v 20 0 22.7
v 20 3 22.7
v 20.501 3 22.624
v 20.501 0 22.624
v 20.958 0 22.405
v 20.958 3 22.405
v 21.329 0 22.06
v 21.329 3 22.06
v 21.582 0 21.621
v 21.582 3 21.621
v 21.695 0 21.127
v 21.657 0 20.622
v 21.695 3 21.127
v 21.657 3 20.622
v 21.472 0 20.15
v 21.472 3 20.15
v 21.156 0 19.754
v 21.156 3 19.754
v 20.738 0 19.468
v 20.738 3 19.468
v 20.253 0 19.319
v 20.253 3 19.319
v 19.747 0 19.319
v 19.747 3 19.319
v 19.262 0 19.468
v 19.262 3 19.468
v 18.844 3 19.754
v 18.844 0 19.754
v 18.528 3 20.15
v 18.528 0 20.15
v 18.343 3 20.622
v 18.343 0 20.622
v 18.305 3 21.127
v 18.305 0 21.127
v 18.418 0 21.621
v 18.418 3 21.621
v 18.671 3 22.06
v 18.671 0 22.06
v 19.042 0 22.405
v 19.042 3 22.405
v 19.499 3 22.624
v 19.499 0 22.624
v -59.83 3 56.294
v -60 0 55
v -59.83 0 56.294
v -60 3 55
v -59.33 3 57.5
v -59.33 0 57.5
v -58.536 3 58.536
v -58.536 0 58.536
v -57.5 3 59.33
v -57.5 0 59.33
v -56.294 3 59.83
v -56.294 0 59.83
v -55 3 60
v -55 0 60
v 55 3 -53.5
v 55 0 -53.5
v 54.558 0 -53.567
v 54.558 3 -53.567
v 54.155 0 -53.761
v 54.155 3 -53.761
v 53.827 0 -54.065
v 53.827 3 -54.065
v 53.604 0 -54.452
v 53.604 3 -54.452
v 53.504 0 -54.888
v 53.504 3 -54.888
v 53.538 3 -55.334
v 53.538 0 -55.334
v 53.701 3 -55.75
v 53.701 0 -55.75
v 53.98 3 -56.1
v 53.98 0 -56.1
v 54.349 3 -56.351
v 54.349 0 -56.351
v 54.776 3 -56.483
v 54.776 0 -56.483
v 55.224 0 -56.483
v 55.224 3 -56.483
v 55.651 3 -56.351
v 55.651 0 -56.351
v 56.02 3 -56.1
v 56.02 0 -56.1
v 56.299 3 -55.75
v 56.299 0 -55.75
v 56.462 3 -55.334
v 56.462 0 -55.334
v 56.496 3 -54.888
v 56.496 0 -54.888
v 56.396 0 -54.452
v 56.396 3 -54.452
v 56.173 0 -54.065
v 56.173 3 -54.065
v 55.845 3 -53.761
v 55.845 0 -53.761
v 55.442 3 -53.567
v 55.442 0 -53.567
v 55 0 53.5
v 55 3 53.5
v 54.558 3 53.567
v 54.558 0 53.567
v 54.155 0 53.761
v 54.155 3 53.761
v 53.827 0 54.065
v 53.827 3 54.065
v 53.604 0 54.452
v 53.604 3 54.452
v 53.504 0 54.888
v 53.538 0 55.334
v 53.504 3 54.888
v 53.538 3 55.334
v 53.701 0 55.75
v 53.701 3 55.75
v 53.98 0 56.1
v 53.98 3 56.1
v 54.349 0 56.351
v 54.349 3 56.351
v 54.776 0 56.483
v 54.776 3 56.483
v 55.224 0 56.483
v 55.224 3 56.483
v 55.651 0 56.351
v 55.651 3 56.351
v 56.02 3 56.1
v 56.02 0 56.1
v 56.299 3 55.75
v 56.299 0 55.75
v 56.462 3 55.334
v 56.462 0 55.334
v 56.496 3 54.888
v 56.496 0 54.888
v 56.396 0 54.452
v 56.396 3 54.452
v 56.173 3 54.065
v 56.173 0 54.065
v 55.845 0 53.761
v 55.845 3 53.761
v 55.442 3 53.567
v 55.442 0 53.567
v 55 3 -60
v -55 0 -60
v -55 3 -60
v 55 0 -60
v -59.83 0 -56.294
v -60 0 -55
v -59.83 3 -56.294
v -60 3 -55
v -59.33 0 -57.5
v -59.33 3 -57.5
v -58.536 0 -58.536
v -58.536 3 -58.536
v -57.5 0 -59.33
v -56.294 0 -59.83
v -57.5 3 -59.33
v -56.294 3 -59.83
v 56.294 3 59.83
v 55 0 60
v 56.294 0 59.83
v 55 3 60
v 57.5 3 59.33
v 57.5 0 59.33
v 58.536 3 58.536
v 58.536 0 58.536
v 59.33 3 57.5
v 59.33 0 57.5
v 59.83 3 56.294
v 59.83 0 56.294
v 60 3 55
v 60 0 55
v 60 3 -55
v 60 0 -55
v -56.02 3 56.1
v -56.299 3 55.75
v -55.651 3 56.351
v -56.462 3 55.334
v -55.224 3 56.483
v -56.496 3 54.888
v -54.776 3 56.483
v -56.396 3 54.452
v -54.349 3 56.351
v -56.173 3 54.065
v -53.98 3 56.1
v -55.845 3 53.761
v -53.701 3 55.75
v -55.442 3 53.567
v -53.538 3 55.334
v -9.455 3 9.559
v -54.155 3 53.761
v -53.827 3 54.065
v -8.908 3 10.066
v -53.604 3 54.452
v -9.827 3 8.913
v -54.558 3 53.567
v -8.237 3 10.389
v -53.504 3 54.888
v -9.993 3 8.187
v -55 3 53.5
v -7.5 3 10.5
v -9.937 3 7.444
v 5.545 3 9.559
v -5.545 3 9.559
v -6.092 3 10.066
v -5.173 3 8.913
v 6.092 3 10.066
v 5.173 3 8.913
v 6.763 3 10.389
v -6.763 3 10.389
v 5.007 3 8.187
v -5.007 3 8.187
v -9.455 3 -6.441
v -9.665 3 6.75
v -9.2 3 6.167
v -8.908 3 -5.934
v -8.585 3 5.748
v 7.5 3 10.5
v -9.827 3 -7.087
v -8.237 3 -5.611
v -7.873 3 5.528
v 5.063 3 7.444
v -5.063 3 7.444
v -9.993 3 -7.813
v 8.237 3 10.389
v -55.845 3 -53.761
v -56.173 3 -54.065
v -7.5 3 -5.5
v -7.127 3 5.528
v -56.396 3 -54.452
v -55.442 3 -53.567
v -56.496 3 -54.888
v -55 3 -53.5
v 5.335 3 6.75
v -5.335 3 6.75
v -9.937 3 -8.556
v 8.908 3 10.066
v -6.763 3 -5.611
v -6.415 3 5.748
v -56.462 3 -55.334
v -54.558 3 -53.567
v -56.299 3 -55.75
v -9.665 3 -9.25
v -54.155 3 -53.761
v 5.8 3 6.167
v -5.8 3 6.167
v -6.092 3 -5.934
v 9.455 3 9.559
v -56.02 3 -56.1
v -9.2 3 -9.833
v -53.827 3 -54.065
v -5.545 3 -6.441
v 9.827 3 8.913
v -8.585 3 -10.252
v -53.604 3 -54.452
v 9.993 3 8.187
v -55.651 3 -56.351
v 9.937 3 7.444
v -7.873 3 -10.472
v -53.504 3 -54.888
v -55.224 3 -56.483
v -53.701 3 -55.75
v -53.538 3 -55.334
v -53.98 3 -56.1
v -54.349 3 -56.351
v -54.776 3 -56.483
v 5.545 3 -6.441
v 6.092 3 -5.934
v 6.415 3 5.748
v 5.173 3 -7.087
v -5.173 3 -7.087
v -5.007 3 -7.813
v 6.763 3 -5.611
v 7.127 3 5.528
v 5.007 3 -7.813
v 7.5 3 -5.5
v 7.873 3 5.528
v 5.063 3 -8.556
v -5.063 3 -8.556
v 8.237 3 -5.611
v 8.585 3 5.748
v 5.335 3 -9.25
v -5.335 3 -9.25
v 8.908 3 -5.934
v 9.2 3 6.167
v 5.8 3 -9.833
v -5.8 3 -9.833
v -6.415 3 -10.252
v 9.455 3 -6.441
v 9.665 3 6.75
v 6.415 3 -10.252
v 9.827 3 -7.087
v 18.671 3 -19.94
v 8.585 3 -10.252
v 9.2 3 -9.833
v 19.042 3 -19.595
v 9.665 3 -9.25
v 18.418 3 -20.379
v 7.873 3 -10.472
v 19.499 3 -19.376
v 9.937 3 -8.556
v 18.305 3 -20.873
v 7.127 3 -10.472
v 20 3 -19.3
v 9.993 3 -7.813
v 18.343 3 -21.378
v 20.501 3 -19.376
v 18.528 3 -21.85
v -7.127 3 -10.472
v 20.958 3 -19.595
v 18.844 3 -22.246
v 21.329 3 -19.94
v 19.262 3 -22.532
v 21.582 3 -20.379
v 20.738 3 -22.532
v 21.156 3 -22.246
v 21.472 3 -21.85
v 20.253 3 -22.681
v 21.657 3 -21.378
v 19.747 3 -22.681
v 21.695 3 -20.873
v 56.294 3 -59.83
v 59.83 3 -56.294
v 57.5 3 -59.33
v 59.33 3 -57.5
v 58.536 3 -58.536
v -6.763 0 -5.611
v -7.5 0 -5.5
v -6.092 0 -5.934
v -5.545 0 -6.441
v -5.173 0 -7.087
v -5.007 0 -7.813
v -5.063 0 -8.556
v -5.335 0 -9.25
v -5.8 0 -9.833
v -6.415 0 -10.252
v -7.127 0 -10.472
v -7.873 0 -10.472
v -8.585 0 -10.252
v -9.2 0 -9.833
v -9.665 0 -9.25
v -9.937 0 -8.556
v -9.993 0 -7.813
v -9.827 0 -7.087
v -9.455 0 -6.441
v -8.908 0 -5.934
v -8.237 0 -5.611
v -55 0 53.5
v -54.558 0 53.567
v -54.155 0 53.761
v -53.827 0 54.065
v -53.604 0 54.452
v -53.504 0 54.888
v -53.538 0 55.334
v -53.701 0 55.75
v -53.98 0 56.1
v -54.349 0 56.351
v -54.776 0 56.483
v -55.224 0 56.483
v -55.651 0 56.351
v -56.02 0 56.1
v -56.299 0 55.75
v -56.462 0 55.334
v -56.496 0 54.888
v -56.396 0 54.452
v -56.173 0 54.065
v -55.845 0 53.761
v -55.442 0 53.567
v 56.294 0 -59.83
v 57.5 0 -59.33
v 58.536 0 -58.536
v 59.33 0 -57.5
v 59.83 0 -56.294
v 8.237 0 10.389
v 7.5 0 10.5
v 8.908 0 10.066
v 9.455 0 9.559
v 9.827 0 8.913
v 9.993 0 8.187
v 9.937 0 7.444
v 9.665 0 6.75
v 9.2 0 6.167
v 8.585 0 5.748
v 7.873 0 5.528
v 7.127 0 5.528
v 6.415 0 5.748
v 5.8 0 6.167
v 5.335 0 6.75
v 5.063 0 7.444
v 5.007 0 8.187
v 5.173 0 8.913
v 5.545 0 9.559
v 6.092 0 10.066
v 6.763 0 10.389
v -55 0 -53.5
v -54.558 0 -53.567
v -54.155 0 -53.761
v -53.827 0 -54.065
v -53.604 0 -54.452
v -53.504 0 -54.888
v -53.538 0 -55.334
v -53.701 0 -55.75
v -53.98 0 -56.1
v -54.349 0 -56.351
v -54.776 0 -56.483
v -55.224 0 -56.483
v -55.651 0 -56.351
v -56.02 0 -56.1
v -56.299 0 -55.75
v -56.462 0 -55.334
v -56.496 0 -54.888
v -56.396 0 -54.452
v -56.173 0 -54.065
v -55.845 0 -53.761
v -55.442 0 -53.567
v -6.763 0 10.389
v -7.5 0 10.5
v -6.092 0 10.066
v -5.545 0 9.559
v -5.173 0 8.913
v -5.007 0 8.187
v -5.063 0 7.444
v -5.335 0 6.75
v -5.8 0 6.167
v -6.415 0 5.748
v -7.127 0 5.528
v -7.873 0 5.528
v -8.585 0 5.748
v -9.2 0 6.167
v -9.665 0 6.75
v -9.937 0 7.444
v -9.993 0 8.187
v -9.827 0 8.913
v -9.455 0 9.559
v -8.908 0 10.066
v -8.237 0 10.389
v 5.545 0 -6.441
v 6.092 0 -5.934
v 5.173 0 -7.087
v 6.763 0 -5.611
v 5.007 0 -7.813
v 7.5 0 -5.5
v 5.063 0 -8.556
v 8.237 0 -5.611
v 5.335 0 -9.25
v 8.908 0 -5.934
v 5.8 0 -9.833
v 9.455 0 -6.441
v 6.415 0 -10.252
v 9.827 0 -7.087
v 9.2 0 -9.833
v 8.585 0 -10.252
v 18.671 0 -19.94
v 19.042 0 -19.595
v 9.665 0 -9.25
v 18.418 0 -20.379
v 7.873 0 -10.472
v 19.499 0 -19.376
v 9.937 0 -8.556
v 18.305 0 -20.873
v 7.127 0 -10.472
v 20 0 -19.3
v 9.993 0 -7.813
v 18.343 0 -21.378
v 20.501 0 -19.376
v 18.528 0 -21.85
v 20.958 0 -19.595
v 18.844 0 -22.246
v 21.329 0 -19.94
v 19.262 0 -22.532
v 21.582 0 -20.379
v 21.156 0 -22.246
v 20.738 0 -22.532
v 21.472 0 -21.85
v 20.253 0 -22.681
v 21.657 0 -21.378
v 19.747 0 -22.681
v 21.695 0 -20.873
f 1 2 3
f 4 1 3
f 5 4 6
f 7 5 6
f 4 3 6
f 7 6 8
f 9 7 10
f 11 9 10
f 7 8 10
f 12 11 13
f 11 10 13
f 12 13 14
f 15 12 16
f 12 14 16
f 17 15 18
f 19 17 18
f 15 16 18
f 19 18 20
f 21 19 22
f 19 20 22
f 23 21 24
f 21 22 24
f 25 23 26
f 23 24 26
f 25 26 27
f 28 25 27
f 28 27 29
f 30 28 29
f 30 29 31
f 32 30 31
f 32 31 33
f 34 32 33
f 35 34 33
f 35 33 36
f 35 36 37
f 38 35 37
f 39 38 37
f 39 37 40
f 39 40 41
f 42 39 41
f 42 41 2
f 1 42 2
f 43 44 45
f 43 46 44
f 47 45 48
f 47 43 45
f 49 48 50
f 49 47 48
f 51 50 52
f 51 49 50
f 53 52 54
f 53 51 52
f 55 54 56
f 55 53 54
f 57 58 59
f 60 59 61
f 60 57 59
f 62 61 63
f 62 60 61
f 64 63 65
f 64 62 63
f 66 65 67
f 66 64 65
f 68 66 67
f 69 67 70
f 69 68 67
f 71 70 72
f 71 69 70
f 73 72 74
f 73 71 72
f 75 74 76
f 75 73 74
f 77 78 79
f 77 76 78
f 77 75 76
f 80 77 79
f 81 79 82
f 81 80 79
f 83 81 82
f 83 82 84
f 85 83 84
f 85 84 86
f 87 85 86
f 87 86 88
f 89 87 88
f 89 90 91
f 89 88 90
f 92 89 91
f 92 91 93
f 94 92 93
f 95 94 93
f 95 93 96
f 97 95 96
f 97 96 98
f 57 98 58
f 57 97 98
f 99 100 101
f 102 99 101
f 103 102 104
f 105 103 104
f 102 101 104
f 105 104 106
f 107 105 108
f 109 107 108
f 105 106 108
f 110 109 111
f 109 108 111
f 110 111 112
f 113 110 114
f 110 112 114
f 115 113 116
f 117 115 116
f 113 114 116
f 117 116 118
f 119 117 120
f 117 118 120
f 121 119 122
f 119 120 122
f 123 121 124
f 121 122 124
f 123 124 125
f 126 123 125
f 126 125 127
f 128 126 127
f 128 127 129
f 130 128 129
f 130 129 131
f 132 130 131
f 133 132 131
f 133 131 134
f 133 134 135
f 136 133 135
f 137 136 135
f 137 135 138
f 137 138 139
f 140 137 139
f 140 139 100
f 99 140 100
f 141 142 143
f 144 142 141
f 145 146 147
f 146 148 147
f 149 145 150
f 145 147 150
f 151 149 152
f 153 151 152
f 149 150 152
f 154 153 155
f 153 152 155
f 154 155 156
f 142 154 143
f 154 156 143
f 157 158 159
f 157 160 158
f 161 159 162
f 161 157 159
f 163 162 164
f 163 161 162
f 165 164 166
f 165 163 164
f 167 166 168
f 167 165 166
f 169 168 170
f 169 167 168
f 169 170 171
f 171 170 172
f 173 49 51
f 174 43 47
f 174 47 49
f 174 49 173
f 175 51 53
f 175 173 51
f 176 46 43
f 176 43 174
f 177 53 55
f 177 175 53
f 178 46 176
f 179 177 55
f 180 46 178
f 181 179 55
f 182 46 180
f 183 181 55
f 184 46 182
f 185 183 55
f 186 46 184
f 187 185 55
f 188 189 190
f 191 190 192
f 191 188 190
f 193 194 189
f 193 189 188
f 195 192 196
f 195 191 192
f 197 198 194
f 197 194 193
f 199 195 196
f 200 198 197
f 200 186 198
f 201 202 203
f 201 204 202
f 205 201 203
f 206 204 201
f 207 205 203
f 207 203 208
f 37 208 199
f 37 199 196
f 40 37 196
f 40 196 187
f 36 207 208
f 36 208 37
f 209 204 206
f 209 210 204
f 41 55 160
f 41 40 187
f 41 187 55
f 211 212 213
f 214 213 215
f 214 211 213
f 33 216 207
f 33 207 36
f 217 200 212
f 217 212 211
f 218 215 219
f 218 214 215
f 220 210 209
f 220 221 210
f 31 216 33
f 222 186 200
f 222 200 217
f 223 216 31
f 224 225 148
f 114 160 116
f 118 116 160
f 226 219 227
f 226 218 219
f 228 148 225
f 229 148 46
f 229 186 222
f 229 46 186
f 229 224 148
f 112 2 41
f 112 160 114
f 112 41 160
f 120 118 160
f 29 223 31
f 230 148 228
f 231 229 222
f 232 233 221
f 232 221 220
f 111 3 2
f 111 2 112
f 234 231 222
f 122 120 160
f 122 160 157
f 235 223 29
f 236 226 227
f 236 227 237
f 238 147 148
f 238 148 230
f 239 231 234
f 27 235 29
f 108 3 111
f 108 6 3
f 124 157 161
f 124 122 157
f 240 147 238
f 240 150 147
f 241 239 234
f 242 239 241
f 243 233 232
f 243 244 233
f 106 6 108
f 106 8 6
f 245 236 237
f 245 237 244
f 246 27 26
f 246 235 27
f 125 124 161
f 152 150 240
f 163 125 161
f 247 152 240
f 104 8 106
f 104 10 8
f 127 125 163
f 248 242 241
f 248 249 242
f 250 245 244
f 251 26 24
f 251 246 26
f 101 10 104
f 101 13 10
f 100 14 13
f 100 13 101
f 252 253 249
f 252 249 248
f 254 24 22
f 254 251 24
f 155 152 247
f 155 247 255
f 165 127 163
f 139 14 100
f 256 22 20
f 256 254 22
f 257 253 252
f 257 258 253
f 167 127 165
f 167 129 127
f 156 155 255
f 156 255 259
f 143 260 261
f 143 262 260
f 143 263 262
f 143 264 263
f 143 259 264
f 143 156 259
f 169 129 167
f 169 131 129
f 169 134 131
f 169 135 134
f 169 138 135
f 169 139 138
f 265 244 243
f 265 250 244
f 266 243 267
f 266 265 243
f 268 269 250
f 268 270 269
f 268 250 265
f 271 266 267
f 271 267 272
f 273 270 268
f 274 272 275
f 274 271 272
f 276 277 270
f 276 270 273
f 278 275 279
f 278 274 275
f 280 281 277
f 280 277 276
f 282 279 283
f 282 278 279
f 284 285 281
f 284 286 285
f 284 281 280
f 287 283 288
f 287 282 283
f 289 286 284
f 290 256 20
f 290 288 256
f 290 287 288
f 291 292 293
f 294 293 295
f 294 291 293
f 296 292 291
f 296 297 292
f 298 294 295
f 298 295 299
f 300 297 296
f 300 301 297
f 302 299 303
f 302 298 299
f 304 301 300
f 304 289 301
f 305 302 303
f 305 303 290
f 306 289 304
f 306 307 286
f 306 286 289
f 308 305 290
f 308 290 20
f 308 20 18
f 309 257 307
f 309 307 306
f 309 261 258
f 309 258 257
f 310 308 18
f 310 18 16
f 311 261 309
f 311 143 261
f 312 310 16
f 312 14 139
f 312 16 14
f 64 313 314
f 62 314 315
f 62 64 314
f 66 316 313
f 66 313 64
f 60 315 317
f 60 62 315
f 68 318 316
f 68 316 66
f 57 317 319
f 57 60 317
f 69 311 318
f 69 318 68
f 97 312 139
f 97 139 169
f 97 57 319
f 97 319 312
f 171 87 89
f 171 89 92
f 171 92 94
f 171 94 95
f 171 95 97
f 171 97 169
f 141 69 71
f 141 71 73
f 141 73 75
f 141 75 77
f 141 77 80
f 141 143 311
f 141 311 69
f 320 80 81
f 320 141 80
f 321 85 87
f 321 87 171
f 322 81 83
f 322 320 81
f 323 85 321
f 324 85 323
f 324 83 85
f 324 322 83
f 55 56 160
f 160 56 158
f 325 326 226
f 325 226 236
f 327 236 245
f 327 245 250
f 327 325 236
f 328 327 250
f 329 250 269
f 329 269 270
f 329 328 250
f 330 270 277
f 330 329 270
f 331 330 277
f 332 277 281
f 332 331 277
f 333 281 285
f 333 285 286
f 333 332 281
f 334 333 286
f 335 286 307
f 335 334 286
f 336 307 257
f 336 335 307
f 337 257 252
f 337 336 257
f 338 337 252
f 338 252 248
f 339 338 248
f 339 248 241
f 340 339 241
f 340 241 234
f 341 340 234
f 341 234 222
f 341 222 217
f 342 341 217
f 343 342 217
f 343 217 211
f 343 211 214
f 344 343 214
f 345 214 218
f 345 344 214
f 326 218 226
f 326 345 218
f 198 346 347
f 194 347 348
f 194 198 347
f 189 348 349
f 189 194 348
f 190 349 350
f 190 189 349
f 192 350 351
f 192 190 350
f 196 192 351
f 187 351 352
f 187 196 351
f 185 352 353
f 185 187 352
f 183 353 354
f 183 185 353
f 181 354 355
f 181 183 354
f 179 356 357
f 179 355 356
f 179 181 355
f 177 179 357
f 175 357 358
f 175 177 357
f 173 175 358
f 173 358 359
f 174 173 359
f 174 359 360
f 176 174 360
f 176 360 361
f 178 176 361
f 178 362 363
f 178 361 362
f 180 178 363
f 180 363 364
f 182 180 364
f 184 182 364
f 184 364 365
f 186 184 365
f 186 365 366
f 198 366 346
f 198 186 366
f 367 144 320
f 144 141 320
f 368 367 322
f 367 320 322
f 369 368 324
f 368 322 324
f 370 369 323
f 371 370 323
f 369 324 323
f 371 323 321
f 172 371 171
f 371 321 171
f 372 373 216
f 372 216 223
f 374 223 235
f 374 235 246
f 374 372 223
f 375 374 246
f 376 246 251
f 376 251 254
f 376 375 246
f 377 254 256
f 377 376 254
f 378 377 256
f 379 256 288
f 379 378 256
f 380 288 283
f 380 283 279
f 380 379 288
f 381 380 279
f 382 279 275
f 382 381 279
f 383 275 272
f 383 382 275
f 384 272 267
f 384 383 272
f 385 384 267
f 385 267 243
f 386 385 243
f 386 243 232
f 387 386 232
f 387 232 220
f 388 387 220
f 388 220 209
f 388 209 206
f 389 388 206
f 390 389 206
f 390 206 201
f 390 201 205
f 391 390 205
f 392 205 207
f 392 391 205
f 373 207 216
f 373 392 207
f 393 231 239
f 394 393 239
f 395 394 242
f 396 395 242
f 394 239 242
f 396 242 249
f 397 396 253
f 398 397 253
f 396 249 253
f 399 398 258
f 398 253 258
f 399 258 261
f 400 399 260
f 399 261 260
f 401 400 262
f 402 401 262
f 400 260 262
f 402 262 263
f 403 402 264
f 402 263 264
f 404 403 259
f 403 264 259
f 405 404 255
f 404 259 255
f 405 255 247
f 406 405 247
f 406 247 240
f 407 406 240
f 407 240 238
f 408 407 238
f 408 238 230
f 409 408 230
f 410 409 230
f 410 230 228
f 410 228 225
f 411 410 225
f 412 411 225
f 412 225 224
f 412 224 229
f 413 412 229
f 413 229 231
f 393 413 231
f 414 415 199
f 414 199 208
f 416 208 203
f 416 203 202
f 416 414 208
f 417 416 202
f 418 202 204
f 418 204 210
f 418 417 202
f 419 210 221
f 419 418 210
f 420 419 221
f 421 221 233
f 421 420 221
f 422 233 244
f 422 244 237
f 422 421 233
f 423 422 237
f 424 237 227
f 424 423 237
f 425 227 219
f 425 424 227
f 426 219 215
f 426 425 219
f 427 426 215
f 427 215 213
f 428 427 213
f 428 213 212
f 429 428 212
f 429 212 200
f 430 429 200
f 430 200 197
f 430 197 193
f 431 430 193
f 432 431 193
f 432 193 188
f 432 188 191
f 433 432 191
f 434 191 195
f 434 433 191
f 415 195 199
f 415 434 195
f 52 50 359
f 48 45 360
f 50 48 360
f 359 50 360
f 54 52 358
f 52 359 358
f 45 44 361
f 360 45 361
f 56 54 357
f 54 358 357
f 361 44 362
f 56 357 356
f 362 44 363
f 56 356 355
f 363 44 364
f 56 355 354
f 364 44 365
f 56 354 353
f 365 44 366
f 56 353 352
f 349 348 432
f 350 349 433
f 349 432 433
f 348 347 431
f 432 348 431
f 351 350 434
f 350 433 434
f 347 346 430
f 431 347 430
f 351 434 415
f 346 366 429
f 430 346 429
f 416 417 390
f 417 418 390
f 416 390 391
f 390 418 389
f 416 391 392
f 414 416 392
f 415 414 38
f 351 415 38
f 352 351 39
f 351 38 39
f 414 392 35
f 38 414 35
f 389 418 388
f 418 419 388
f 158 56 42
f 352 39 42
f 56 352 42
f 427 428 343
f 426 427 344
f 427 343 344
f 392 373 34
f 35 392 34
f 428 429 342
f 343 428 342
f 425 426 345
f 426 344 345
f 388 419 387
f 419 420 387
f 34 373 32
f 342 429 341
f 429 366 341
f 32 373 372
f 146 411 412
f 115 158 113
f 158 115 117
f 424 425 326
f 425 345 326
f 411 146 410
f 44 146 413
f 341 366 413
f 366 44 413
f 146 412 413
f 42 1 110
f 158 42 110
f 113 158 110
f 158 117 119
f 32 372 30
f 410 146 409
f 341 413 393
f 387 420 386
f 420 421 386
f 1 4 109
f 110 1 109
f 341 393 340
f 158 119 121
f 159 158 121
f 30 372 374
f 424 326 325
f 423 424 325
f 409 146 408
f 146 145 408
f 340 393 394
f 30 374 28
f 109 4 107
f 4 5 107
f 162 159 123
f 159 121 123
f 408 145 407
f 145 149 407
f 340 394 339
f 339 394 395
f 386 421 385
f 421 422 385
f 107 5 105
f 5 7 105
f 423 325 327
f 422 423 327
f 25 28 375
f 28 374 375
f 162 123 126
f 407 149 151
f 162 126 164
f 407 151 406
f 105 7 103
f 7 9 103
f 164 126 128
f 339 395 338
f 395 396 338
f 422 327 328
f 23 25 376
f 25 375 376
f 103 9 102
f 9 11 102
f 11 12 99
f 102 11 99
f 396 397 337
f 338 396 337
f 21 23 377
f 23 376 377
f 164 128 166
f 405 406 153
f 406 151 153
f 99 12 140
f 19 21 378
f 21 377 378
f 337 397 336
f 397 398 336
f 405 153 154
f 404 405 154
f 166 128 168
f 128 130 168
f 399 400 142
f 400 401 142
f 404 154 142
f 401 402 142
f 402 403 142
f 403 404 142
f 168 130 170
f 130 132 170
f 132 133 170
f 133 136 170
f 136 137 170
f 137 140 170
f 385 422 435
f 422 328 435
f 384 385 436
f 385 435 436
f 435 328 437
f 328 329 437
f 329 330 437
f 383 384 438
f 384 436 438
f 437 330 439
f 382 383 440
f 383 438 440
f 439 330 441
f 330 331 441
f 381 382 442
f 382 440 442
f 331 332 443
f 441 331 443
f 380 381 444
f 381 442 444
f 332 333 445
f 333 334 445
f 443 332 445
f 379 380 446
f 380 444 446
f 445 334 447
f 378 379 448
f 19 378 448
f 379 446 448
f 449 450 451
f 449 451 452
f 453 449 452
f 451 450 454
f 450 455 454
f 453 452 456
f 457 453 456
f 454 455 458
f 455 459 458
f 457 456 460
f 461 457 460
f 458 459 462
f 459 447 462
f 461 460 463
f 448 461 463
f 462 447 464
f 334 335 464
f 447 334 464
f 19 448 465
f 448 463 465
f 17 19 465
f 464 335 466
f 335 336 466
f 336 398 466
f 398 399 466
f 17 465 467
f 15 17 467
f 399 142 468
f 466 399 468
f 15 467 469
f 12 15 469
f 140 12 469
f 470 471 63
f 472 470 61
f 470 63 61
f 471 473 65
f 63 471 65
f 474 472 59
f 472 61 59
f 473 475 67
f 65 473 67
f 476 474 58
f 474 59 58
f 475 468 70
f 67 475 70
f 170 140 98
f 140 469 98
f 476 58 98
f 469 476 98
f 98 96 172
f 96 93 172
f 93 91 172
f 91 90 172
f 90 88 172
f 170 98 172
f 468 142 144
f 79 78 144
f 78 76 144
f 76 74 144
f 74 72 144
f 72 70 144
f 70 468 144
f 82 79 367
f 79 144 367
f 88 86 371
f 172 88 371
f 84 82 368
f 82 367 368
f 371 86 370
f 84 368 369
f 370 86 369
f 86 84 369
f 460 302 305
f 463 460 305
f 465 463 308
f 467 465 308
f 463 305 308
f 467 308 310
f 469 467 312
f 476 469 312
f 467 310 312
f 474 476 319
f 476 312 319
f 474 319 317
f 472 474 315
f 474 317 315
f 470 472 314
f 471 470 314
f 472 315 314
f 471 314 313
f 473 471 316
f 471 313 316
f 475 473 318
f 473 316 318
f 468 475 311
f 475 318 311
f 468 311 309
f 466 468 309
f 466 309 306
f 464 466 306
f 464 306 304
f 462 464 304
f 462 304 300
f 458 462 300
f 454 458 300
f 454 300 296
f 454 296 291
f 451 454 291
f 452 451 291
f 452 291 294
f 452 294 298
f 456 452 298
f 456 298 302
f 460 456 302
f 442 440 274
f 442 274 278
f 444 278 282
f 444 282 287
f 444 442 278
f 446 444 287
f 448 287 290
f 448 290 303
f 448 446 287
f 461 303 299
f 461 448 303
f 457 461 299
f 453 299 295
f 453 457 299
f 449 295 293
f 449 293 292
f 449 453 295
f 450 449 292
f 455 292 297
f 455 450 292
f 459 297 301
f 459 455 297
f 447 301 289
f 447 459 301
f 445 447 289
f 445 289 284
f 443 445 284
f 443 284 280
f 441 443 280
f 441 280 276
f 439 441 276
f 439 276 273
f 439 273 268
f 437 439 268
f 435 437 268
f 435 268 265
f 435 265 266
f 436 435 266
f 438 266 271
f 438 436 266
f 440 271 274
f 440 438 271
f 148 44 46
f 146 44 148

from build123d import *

# Parameters (mm, degrees)
SKETCH1_W                                  = 120
SKETCH1_H                                  = 120
SKETCH1_R                                  = 2.5
BOSS_EXTRUDE1_DEPTH                        = 3
FILLET1_R                                  = 5
SKETCH2_R                                  = 1.5
CUT_EXTRUDE1_DEPTH                         = 85.905830189
MIRROR3_AT_THE_SECOND_PLANE_COPY_1_SKETC_R = 1.5
MIRROR3_AT_THE_SECOND_PLANE_COPY_1_DEPTH   = 85.905830189
SKETCH3_R                                  = 1.7
CUT_EXTRUDE2_DEPTH                         = 85.905830189


with BuildPart() as part:
    # Sketch1 → Boss-Extrude1 (new body)
    with BuildSketch(Plane(origin=(0, 0, 0), x_dir=(1, 0, 0), z_dir=(0, 1, 0))):
        Rectangle(SKETCH1_W, SKETCH1_H)
        with Locations(Location((-7.5, -8, 0), (0, 0, 270))):
            Circle(SKETCH1_R, mode=Mode.SUBTRACT)
        with Locations(Location((7.5, 8, 0), (0, 0, 270))):
            Circle(SKETCH1_R, mode=Mode.SUBTRACT)
        with Locations(Location((7.5, -8, 0), (0, 0, 270))):
            Circle(SKETCH1_R, mode=Mode.SUBTRACT)
        with Locations(Location((-7.5, 8, 0), (0, 0, 270))):
            Circle(SKETCH1_R, mode=Mode.SUBTRACT)
    extrude(amount=BOSS_EXTRUDE1_DEPTH)

    # Fillet1
    fillet1_edges = [part.edges().sort_by_distance(p)[0] for p in [
        (60, 1.5, 60),
        (-60, 1.5, 60),
        (-60, 1.5, -60),
        (60, 1.5, -60),
    ]]
    fillet(fillet1_edges, radius=FILLET1_R)

    # Sketch2 → Cut-Extrude1 (cut, through all)
    with BuildSketch(Plane(origin=(0, 3, 0), x_dir=(1, 0, 0), z_dir=(0, 1, 0))):
        with Locations(Location((-55, 55, 0), (0, 0, 270))):
            Circle(SKETCH2_R)
    cut_extrude1 = extrude(amount=-CUT_EXTRUDE1_DEPTH, mode=Mode.SUBTRACT)

    # Mirror3: Cut-Extrude1 across plane
    add(cut_extrude1.mirror(Plane.XY), mode=Mode.SUBTRACT)

    # Mirror3 at the second plane: Cut-Extrude1 across plane
    add(cut_extrude1.mirror(Plane(origin=(0, 0, 0), x_dir=(0, 0, 1), z_dir=(1, 0, 0))), mode=Mode.SUBTRACT)

    # Mirror3 at the second plane copy 1 sketc → Mirror3 at the second plane copy 1 (cut, through all)
    with BuildSketch(Plane(origin=(0, 3, 0), x_dir=(-1, 0, 0), z_dir=(0, 1, 0))):
        with Locations(Location((-55, 55, 0), (0, 0, 270))):
            Circle(MIRROR3_AT_THE_SECOND_PLANE_COPY_1_SKETC_R)
    extrude(amount=-MIRROR3_AT_THE_SECOND_PLANE_COPY_1_DEPTH, mode=Mode.SUBTRACT)

    # Sketch3 → Cut-Extrude2 (cut, through all)
    with BuildSketch(Plane(origin=(0, 3, 0), x_dir=(1, 0, 0), z_dir=(0, 1, 0))):
        with Locations(Location((20, 21, 0), (0, 0, 270))):
            Circle(SKETCH3_R)
        with Locations(Location((20, -21, 0), (0, 0, 270))):
            Circle(SKETCH3_R)
    extrude(amount=-CUT_EXTRUDE2_DEPTH, mode=Mode.SUBTRACT)


solid = part.part
